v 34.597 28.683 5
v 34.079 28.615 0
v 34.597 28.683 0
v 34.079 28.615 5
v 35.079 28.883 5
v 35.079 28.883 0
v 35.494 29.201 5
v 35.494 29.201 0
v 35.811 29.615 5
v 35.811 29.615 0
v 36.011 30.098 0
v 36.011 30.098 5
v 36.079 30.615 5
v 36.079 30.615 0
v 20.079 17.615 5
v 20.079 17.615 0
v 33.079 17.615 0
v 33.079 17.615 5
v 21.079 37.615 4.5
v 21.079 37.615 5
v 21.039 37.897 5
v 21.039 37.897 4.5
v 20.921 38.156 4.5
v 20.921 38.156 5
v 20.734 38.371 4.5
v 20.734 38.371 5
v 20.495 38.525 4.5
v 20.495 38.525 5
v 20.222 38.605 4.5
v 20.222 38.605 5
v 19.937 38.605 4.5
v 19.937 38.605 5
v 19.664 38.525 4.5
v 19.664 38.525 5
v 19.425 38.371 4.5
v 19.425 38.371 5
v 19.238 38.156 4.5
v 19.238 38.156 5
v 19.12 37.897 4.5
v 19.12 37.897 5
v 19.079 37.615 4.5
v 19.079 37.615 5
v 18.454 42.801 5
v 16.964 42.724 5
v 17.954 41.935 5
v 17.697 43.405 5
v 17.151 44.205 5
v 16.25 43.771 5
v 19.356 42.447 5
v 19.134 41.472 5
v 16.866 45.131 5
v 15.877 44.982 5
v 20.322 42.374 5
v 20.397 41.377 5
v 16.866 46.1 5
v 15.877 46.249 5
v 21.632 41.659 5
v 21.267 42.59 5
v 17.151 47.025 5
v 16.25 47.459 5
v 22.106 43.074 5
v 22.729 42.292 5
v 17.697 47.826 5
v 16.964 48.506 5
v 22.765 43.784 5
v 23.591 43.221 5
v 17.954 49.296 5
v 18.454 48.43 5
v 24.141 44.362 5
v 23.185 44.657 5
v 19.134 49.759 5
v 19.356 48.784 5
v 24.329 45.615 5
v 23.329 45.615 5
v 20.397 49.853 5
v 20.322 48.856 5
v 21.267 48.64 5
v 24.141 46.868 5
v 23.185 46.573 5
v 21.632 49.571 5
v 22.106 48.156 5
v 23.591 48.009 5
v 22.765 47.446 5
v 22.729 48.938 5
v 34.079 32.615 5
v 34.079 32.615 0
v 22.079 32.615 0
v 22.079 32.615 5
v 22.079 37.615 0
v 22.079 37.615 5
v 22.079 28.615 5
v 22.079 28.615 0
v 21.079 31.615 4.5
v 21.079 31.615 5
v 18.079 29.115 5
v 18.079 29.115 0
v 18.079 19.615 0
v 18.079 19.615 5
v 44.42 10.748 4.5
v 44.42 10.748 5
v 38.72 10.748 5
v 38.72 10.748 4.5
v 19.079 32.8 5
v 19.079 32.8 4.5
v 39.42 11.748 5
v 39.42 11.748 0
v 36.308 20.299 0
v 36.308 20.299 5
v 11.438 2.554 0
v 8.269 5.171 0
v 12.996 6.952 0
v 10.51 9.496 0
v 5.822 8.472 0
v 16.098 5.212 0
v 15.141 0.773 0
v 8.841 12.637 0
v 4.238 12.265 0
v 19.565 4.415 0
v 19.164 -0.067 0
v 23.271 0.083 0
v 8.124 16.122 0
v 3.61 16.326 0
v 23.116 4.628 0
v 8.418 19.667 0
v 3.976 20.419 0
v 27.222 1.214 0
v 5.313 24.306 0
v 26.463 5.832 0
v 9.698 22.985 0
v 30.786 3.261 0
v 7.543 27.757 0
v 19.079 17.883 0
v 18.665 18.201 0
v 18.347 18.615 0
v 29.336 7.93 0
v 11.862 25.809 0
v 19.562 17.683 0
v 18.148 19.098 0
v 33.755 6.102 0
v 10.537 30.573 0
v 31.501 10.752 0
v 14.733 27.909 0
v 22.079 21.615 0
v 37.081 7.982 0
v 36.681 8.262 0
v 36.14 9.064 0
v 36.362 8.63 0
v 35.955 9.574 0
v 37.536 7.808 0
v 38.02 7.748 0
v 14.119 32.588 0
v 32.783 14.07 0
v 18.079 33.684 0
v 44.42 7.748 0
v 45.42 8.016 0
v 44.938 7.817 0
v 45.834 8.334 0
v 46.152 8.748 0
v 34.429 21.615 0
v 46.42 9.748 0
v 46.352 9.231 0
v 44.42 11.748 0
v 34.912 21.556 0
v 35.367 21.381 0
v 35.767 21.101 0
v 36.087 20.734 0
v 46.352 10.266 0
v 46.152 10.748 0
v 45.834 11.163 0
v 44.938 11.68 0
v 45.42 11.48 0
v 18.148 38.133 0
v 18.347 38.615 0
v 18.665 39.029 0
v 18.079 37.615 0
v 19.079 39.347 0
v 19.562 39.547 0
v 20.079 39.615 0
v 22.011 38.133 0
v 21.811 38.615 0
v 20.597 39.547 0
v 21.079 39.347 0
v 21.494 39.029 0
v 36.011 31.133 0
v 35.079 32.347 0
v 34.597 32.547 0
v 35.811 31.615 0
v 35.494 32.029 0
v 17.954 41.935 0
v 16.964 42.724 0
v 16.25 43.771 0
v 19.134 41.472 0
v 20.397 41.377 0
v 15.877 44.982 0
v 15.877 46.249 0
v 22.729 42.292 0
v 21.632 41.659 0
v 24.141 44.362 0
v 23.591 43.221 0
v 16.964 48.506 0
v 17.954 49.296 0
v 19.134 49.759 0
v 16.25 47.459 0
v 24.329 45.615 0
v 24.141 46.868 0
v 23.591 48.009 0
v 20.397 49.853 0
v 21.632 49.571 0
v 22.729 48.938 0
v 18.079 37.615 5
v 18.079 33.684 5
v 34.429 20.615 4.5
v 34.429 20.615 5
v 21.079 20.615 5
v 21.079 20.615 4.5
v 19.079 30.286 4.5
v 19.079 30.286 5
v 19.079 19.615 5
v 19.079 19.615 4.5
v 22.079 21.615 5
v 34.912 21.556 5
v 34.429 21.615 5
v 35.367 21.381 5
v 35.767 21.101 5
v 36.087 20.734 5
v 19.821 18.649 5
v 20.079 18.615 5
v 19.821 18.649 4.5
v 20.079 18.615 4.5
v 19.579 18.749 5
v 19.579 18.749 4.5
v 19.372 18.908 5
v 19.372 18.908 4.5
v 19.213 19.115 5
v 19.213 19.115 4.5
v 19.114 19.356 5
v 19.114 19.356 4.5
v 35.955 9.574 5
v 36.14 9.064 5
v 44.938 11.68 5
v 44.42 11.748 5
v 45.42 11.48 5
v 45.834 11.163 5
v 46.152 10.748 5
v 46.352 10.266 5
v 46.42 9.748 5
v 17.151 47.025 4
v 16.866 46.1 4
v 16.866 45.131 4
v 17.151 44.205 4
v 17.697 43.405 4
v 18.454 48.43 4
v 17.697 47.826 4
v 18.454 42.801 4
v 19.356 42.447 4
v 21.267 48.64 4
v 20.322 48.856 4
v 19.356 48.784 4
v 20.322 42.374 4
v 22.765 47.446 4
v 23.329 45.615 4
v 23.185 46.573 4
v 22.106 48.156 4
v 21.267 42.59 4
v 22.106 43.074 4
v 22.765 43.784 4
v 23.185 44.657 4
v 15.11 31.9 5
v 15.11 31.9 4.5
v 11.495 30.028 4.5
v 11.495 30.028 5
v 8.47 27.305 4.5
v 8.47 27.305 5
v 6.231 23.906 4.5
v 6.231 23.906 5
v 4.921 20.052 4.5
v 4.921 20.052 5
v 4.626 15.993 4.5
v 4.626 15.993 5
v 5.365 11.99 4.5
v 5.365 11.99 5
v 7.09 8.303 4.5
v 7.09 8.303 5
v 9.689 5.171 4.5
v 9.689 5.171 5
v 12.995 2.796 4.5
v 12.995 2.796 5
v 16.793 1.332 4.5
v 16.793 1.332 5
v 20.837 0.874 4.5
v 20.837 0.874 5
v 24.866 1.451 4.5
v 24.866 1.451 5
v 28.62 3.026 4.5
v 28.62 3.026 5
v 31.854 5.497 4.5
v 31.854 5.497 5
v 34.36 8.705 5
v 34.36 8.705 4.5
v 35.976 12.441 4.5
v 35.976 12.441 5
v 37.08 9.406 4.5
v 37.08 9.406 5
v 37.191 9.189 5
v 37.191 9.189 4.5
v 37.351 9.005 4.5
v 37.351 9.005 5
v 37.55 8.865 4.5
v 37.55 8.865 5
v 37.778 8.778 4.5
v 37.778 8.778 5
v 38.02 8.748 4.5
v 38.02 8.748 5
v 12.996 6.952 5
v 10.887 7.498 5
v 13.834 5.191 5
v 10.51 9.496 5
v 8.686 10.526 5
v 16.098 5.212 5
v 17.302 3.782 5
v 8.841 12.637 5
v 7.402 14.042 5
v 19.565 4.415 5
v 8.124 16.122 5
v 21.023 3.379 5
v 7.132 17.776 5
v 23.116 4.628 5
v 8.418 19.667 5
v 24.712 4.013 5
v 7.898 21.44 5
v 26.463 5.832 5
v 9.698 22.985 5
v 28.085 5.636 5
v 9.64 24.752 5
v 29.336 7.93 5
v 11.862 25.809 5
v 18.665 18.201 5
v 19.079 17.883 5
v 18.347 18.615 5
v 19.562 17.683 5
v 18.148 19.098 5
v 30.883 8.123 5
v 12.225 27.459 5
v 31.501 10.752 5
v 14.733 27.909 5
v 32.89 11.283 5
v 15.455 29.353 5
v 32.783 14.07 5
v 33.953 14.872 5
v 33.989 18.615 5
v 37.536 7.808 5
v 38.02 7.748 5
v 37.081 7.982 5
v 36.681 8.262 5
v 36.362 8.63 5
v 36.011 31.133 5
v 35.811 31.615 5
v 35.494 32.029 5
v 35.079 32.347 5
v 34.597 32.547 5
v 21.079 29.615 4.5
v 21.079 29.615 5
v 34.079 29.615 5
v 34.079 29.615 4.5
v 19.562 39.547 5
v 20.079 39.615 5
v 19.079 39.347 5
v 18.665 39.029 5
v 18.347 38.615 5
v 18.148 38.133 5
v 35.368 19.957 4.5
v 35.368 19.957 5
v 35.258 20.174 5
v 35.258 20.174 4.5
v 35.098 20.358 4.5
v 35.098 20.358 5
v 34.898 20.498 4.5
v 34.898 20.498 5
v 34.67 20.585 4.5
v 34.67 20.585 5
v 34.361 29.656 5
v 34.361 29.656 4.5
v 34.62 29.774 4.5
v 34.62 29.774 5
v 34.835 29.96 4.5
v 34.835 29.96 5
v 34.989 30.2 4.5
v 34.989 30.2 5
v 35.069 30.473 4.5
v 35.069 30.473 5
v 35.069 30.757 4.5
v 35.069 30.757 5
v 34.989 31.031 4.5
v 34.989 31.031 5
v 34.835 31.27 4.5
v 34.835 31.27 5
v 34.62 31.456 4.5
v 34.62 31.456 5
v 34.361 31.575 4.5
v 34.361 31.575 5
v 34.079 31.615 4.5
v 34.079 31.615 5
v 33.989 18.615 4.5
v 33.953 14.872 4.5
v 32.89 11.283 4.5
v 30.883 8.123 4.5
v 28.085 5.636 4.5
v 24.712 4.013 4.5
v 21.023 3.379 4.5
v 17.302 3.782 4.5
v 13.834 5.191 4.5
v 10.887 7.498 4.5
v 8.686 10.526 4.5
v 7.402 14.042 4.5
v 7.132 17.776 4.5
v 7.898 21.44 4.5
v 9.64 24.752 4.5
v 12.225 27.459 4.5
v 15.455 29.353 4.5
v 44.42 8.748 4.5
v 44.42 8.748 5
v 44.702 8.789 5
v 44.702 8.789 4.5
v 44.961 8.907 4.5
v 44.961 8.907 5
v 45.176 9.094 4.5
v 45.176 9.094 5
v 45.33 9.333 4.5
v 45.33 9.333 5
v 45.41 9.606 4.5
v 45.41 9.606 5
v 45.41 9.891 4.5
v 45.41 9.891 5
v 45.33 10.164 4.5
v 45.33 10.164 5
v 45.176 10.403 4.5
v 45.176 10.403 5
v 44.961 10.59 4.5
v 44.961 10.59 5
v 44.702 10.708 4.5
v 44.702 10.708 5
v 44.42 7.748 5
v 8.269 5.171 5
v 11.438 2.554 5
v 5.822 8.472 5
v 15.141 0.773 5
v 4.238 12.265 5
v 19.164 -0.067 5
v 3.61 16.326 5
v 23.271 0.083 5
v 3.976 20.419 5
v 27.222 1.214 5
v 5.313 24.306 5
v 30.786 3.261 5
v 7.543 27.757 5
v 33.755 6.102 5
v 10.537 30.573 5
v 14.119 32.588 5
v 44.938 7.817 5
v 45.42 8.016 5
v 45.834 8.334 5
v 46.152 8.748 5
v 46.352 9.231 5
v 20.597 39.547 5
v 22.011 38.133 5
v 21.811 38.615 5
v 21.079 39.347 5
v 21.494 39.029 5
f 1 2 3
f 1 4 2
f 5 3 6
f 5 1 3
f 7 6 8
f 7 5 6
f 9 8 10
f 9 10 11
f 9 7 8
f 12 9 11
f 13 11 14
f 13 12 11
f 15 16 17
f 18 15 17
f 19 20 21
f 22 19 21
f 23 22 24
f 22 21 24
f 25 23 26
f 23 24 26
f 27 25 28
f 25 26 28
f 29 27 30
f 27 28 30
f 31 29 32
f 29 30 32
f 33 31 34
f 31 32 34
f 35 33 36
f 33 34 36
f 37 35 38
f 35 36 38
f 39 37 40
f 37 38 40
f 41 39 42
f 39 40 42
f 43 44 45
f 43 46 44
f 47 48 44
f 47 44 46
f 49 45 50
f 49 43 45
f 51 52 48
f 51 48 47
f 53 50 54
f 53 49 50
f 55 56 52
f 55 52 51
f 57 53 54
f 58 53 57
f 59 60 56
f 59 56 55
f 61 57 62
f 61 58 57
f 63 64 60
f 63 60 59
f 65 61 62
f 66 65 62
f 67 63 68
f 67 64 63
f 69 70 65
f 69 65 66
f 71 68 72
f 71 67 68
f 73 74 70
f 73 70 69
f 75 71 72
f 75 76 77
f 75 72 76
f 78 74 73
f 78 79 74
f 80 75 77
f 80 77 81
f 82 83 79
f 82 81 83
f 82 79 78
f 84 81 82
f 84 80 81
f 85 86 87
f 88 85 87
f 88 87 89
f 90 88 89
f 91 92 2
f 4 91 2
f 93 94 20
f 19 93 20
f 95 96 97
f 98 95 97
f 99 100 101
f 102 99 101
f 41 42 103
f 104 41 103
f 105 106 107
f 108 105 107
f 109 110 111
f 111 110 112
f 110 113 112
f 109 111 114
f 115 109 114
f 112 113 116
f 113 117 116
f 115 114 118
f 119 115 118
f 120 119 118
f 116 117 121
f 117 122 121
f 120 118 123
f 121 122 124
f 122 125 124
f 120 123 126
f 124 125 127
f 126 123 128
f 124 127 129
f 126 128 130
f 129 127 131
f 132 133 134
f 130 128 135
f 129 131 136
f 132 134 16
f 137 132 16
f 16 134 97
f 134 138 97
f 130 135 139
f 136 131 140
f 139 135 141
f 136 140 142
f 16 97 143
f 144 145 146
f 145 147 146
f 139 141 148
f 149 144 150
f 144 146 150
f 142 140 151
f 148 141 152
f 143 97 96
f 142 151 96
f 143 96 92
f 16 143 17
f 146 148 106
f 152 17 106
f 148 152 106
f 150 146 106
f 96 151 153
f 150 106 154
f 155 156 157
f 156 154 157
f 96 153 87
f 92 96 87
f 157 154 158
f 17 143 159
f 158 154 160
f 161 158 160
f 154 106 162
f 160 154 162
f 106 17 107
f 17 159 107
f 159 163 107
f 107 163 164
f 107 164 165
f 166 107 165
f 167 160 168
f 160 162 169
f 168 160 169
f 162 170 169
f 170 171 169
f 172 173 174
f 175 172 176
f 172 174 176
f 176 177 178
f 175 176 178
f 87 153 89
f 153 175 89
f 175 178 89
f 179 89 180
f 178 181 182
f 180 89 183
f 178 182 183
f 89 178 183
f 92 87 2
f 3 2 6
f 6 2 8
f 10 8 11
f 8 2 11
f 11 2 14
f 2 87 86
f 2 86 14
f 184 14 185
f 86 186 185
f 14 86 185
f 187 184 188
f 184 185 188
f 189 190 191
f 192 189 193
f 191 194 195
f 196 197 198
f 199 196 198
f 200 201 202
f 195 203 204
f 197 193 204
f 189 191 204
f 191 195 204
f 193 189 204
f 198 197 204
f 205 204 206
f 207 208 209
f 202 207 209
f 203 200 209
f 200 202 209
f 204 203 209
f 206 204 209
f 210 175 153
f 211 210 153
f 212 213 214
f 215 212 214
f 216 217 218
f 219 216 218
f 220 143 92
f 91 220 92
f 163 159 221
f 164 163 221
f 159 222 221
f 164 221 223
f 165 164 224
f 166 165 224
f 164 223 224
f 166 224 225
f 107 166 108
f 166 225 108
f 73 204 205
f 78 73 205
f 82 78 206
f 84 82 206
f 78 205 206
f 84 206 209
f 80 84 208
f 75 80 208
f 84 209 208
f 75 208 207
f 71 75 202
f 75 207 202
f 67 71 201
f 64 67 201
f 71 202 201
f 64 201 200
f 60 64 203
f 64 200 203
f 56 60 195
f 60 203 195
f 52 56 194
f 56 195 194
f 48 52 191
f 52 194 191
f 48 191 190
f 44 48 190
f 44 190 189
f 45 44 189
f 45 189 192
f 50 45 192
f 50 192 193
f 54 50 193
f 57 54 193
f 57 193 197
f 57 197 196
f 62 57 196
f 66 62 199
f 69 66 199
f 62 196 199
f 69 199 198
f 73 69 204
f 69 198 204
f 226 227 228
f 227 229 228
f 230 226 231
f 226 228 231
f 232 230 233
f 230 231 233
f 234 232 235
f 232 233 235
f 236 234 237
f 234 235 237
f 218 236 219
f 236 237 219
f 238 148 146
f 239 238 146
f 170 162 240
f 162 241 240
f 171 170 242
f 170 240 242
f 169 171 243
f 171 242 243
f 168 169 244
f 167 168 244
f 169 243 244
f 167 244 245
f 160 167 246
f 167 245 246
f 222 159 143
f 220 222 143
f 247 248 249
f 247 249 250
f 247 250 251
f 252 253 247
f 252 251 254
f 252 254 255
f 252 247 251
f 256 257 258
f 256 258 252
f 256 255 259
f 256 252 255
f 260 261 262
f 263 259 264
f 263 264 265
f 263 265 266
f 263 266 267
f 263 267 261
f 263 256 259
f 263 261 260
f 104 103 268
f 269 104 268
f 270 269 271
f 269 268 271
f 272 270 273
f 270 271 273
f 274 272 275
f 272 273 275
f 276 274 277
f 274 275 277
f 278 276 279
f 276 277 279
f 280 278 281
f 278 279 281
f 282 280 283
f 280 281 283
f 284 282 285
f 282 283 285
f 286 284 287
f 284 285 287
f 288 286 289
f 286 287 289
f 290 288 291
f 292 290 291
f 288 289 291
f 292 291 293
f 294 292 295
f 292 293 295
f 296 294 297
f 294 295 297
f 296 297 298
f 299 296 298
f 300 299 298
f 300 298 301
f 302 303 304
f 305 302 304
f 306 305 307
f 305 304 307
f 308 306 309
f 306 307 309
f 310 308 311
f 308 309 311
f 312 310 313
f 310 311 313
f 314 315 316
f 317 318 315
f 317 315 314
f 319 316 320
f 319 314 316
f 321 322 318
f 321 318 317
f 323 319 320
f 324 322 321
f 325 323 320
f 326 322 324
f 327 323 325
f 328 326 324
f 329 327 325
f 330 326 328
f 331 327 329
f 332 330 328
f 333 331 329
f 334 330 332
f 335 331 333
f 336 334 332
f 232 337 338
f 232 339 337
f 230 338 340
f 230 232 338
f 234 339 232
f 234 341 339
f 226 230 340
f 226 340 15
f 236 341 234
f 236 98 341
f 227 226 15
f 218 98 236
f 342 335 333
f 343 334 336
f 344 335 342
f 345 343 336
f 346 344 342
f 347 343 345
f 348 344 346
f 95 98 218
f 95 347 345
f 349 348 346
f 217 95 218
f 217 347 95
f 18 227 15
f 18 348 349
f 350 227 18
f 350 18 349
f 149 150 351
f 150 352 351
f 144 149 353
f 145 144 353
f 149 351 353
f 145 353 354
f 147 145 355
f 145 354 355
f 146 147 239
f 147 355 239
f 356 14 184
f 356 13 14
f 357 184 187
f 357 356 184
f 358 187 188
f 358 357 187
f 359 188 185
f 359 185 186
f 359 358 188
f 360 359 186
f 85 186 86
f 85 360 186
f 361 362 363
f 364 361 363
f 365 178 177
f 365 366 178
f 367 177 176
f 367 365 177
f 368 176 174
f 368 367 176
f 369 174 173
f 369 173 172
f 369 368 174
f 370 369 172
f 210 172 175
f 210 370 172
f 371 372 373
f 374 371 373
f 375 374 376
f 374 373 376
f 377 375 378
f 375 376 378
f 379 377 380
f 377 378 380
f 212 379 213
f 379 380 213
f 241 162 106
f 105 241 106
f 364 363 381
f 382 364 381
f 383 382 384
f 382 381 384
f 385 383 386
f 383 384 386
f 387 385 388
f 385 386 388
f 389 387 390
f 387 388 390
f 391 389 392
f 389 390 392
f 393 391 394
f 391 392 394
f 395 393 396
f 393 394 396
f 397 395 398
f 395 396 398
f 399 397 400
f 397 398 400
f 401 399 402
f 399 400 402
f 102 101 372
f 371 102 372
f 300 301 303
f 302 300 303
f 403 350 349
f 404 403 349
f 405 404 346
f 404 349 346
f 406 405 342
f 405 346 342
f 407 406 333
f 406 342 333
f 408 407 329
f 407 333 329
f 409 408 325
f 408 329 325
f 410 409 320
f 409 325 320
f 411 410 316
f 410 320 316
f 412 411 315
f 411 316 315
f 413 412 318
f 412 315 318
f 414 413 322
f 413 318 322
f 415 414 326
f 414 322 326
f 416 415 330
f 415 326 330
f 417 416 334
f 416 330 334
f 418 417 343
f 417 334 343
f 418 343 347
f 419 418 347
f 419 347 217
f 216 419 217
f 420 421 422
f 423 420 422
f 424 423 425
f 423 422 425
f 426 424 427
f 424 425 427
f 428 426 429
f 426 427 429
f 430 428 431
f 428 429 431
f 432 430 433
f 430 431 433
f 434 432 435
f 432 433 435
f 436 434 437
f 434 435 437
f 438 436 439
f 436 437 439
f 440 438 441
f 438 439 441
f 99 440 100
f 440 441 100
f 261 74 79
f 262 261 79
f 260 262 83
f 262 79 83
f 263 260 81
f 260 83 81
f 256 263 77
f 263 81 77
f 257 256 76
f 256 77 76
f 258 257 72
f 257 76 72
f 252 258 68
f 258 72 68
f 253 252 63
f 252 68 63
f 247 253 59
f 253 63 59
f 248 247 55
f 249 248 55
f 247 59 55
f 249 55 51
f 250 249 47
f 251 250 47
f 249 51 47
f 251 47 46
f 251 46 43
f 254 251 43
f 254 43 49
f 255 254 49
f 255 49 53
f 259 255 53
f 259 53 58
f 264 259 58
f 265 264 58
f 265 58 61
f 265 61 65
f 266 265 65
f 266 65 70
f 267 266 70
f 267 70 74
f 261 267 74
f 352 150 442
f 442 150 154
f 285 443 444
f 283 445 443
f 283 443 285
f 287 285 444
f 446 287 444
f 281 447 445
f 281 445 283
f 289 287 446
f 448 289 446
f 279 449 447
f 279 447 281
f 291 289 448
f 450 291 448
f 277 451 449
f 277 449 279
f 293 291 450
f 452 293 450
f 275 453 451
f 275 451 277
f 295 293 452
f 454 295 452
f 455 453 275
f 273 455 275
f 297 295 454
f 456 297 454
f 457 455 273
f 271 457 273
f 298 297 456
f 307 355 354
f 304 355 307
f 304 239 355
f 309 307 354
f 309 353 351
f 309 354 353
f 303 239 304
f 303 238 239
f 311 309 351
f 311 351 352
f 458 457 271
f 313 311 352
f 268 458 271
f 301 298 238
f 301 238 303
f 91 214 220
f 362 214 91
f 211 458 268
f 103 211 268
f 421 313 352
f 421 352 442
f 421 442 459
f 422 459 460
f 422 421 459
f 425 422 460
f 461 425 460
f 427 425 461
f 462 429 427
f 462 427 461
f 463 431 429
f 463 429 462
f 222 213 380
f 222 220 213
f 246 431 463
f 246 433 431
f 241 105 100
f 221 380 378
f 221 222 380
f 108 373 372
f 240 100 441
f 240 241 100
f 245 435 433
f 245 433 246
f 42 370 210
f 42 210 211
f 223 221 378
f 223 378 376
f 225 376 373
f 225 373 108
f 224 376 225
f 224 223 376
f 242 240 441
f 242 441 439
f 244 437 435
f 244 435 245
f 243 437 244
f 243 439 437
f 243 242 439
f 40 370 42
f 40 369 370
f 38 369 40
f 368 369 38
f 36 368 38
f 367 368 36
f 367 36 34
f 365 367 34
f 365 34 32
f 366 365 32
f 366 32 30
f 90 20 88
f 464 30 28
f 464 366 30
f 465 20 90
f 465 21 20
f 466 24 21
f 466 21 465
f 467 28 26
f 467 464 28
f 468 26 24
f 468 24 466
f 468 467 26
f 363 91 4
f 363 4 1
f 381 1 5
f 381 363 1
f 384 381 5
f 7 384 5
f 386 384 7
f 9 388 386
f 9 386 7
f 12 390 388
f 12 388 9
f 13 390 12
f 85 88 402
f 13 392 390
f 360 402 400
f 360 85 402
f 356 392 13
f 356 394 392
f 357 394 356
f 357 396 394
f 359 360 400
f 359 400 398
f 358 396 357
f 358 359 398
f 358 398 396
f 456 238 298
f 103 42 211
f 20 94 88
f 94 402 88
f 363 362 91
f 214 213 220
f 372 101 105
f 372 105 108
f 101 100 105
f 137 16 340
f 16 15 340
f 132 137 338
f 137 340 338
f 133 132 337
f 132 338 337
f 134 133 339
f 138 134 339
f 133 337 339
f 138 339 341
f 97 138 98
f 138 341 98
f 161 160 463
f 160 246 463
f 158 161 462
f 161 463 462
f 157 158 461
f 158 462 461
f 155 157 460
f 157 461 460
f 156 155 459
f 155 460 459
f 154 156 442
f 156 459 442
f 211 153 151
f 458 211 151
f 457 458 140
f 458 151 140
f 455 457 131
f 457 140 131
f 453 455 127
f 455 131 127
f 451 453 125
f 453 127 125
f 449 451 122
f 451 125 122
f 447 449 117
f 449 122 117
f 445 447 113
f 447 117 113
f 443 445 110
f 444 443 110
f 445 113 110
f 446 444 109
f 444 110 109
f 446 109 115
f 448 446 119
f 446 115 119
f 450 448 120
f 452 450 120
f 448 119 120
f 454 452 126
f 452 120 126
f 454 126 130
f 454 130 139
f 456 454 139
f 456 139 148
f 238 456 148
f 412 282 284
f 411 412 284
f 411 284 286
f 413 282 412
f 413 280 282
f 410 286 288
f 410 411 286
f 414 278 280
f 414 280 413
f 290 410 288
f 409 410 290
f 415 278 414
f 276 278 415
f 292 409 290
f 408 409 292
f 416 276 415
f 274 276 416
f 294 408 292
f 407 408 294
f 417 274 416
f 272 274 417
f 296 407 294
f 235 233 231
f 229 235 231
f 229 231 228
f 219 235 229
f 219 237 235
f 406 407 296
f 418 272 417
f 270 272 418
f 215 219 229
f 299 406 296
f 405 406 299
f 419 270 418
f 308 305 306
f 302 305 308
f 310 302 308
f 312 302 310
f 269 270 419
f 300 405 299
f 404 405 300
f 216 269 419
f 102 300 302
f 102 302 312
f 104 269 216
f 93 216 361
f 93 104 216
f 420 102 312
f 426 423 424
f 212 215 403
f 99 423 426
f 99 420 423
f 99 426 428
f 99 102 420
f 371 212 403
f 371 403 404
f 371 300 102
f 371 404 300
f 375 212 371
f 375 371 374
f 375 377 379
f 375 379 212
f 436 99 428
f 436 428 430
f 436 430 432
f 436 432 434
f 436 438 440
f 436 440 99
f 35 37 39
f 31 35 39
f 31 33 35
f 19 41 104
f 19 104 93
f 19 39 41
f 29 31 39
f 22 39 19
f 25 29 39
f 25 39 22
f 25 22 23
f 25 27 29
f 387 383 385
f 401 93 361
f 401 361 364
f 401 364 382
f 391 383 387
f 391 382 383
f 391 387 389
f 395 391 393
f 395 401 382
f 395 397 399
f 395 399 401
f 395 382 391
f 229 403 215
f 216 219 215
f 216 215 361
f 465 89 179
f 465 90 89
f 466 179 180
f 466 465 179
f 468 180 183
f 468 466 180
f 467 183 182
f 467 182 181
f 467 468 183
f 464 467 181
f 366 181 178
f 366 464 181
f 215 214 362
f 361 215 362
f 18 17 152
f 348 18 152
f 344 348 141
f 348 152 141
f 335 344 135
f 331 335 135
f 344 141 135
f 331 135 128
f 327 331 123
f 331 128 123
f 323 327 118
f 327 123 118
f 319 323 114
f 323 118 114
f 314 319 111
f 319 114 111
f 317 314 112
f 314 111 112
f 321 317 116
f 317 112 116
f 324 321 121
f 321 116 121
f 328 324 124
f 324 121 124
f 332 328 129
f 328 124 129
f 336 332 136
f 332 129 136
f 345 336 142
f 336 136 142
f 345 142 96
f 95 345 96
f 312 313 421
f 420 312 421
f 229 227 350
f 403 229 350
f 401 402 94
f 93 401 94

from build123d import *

# Parameters (mm, degrees)
F1_DEPTH = 5
F0_R     = 4.25
F2_R     = 1.99999
F3_R     = 3.25
F4_DEPTH = 0.5
F5_R     = 1
F6_R     = 3.25
F7_DEPTH = 1


# Not quite as in the source:
# - a fillet or chamfer is up to 0.001 mm smaller than in the source, because OpenCascade refuses the exact size


with BuildPart() as f1:
    # F0 (on Top) → F1 (new body)
    with BuildSketch(Plane.XY):
        with BuildLine():
            Line((35.8289553412, 21.6151545151), (22.0794297924, 21.6151545151))
            Line((22.0794297924, 21.6151545151), (22.0794297924, 28.6151545151))
            Line((22.0794297924, 28.6151545151), (36.0794297924, 28.6151545151))
            Line((36.0794297924, 28.6151545151), (36.0794297924, 32.6151545151))
            Line((36.0794297924, 32.6151545151), (22.0794297924, 32.6151545151))
            Line((22.0794297924, 32.6151545151), (22.0794297924, 39.6151545151))
            Line((22.0794297924, 39.6151545151), (18.0794297924, 39.6151545151))
            Line((18.0794297924, 39.6151545151), (18.0794297924, 33.6841086822))
            ThreePointArc((18.0794297924, 33.6841086822), (6.9453736492, 6.7475398575), (35.9550171357, 9.5735849806))
            Line((35.9550171357, 9.5735849806), (36.6193366933, 7.7483819969))
            Line((36.6193366933, 7.7483819969), (46.4201668461, 7.7483819969))
            Line((46.4201668461, 7.7483819969), (46.4201668461, 11.7483819969))
            Line((46.4201668461, 11.7483819969), (39.4201668461, 11.7483819969))
            Line((39.4201668461, 11.7483819969), (35.8289553412, 21.6151545151))
        make_face()
        with BuildLine():
            ThreePointArc((33.0794297924, 17.6151545151), (12.9961320833, 6.9521575032), (18.0794297924, 29.1151545151))
            Line((18.0794297924, 29.1151545151), (18.0794297924, 17.6151545151))
            Line((18.0794297924, 17.6151545151), (33.0794297924, 17.6151545151))
        make_face(mode=Mode.SUBTRACT)
    extrude(amount=F1_DEPTH)

    # F2 (radius 2 in the source; OpenCascade refuses exactly that, so slightly less here)
    f2_edges = [f1.edges().sort_by_distance(p)[0] for p in [
        (18.07943, 39.615155, 2.5),
        (22.07943, 39.615155, 2.5),
        (35.828955, 21.615155, 2.5),
        (36.07943, 28.615155, 2.5),
        (36.07943, 32.615155, 2.5),
        (46.420167, 11.748382, 2.5),
        (46.420167, 7.748382, 2.5),
        (18.07943, 17.615155, 2.5),
        (36.619337, 7.748382, 2.5),
    ]]
    fillet(f2_edges, radius=F2_R)


with BuildPart() as f1b:
    # F0 (on Top) → F1, piece 2 (new body)
    with BuildSketch(Plane.XY):
        with Locations((20.0794297924, 45.6151545151)):
            Circle(F0_R)
    extrude(amount=F1_DEPTH)


with BuildPart() as f4_tool:
    # F3 (on face) → F4 (new body)
    with BuildSketch(Plane.XY.offset(5)):
        with BuildLine():
            Line((19.0794297924, 37.6151545151), (19.0794297924, 32.799673159))
            ThreePointArc((19.0794297924, 32.799673159), (8.2893286135, 6.654126324), (35.975610287, 12.4408101625))
            Line((35.975610287, 12.4408101625), (37.0800591489, 9.4063618536))
            ThreePointArc((37.0800591489, 9.4063618536), (37.4461753333, 8.9292299526), (38.0197517697, 8.7483819969))
            Line((38.0197517697, 8.7483819969), (44.4201668461, 8.7483819969))
            ThreePointArc((44.4201668461, 8.7483819969), (45.4201668461, 9.7483819969), (44.4201668461, 10.7483819969))
            Line((44.4201668461, 10.7483819969), (38.7199593079, 10.7483819969))
            Line((38.7199593079, 10.7483819969), (35.3682328855, 19.9571746585))
            ThreePointArc((35.3682328855, 19.9571746585), (35.0021167011, 20.4343065594), (34.4285402648, 20.6151545151))
            Line((34.4285402648, 20.6151545151), (21.0794297924, 20.6151545151))
            Line((21.0794297924, 20.6151545151), (21.0794297924, 29.6151545151))
            Line((21.0794297924, 29.6151545151), (34.0794297924, 29.6151545151))
            ThreePointArc((34.0794297924, 29.6151545151), (35.0794297924, 30.6151545151), (34.0794297924, 31.6151545151))
            Line((34.0794297924, 31.6151545151), (21.0794297924, 31.6151545151))
            Line((21.0794297924, 31.6151545151), (21.0794297924, 37.6151545151))
            ThreePointArc((21.0794297924, 37.6151545151), (20.0794297924, 38.6151545151), (19.0794297924, 37.6151545151))
        make_face()
        with BuildLine():
            ThreePointArc((33.9885439185, 18.6151545151), (12.2800387641, 6.2419574428), (19.0794297924, 30.2861559837))
            Line((19.0794297924, 30.2861559837), (19.0794297924, 18.6151545151))
            Line((19.0794297924, 18.6151545151), (33.9885439185, 18.6151545151))
        make_face(mode=Mode.SUBTRACT)
        with Locations((20.0794297924, 45.6151545151)):
            Circle(F3_R)
    extrude(amount=-F4_DEPTH)


with BuildPart() as f1_1:
    add(f1.part)

    # F4: cut by f4_tool
    add(f4_tool.part, mode=Mode.SUBTRACT)

    # F5
    f5_edges = [f1_1.edges().sort_by_distance(p)[0] for p in [
        (19.07943, 18.615155, 4.75),
    ]]
    fillet(f5_edges, radius=F5_R)


with BuildPart() as f1b_1:
    add(f1b.part)

    # F4: cut by f4_tool
    add(f4_tool.part, mode=Mode.SUBTRACT)

    # F6 (on face) → F7 (cut)
    with BuildSketch(Plane.XY.offset(5)):
        with Locations((20.0794297924, 45.6151545151)):
            Circle(F6_R)
    extrude(amount=-F7_DEPTH, mode=Mode.SUBTRACT)


solid = Compound([f1_1.part, f1b_1.part])
